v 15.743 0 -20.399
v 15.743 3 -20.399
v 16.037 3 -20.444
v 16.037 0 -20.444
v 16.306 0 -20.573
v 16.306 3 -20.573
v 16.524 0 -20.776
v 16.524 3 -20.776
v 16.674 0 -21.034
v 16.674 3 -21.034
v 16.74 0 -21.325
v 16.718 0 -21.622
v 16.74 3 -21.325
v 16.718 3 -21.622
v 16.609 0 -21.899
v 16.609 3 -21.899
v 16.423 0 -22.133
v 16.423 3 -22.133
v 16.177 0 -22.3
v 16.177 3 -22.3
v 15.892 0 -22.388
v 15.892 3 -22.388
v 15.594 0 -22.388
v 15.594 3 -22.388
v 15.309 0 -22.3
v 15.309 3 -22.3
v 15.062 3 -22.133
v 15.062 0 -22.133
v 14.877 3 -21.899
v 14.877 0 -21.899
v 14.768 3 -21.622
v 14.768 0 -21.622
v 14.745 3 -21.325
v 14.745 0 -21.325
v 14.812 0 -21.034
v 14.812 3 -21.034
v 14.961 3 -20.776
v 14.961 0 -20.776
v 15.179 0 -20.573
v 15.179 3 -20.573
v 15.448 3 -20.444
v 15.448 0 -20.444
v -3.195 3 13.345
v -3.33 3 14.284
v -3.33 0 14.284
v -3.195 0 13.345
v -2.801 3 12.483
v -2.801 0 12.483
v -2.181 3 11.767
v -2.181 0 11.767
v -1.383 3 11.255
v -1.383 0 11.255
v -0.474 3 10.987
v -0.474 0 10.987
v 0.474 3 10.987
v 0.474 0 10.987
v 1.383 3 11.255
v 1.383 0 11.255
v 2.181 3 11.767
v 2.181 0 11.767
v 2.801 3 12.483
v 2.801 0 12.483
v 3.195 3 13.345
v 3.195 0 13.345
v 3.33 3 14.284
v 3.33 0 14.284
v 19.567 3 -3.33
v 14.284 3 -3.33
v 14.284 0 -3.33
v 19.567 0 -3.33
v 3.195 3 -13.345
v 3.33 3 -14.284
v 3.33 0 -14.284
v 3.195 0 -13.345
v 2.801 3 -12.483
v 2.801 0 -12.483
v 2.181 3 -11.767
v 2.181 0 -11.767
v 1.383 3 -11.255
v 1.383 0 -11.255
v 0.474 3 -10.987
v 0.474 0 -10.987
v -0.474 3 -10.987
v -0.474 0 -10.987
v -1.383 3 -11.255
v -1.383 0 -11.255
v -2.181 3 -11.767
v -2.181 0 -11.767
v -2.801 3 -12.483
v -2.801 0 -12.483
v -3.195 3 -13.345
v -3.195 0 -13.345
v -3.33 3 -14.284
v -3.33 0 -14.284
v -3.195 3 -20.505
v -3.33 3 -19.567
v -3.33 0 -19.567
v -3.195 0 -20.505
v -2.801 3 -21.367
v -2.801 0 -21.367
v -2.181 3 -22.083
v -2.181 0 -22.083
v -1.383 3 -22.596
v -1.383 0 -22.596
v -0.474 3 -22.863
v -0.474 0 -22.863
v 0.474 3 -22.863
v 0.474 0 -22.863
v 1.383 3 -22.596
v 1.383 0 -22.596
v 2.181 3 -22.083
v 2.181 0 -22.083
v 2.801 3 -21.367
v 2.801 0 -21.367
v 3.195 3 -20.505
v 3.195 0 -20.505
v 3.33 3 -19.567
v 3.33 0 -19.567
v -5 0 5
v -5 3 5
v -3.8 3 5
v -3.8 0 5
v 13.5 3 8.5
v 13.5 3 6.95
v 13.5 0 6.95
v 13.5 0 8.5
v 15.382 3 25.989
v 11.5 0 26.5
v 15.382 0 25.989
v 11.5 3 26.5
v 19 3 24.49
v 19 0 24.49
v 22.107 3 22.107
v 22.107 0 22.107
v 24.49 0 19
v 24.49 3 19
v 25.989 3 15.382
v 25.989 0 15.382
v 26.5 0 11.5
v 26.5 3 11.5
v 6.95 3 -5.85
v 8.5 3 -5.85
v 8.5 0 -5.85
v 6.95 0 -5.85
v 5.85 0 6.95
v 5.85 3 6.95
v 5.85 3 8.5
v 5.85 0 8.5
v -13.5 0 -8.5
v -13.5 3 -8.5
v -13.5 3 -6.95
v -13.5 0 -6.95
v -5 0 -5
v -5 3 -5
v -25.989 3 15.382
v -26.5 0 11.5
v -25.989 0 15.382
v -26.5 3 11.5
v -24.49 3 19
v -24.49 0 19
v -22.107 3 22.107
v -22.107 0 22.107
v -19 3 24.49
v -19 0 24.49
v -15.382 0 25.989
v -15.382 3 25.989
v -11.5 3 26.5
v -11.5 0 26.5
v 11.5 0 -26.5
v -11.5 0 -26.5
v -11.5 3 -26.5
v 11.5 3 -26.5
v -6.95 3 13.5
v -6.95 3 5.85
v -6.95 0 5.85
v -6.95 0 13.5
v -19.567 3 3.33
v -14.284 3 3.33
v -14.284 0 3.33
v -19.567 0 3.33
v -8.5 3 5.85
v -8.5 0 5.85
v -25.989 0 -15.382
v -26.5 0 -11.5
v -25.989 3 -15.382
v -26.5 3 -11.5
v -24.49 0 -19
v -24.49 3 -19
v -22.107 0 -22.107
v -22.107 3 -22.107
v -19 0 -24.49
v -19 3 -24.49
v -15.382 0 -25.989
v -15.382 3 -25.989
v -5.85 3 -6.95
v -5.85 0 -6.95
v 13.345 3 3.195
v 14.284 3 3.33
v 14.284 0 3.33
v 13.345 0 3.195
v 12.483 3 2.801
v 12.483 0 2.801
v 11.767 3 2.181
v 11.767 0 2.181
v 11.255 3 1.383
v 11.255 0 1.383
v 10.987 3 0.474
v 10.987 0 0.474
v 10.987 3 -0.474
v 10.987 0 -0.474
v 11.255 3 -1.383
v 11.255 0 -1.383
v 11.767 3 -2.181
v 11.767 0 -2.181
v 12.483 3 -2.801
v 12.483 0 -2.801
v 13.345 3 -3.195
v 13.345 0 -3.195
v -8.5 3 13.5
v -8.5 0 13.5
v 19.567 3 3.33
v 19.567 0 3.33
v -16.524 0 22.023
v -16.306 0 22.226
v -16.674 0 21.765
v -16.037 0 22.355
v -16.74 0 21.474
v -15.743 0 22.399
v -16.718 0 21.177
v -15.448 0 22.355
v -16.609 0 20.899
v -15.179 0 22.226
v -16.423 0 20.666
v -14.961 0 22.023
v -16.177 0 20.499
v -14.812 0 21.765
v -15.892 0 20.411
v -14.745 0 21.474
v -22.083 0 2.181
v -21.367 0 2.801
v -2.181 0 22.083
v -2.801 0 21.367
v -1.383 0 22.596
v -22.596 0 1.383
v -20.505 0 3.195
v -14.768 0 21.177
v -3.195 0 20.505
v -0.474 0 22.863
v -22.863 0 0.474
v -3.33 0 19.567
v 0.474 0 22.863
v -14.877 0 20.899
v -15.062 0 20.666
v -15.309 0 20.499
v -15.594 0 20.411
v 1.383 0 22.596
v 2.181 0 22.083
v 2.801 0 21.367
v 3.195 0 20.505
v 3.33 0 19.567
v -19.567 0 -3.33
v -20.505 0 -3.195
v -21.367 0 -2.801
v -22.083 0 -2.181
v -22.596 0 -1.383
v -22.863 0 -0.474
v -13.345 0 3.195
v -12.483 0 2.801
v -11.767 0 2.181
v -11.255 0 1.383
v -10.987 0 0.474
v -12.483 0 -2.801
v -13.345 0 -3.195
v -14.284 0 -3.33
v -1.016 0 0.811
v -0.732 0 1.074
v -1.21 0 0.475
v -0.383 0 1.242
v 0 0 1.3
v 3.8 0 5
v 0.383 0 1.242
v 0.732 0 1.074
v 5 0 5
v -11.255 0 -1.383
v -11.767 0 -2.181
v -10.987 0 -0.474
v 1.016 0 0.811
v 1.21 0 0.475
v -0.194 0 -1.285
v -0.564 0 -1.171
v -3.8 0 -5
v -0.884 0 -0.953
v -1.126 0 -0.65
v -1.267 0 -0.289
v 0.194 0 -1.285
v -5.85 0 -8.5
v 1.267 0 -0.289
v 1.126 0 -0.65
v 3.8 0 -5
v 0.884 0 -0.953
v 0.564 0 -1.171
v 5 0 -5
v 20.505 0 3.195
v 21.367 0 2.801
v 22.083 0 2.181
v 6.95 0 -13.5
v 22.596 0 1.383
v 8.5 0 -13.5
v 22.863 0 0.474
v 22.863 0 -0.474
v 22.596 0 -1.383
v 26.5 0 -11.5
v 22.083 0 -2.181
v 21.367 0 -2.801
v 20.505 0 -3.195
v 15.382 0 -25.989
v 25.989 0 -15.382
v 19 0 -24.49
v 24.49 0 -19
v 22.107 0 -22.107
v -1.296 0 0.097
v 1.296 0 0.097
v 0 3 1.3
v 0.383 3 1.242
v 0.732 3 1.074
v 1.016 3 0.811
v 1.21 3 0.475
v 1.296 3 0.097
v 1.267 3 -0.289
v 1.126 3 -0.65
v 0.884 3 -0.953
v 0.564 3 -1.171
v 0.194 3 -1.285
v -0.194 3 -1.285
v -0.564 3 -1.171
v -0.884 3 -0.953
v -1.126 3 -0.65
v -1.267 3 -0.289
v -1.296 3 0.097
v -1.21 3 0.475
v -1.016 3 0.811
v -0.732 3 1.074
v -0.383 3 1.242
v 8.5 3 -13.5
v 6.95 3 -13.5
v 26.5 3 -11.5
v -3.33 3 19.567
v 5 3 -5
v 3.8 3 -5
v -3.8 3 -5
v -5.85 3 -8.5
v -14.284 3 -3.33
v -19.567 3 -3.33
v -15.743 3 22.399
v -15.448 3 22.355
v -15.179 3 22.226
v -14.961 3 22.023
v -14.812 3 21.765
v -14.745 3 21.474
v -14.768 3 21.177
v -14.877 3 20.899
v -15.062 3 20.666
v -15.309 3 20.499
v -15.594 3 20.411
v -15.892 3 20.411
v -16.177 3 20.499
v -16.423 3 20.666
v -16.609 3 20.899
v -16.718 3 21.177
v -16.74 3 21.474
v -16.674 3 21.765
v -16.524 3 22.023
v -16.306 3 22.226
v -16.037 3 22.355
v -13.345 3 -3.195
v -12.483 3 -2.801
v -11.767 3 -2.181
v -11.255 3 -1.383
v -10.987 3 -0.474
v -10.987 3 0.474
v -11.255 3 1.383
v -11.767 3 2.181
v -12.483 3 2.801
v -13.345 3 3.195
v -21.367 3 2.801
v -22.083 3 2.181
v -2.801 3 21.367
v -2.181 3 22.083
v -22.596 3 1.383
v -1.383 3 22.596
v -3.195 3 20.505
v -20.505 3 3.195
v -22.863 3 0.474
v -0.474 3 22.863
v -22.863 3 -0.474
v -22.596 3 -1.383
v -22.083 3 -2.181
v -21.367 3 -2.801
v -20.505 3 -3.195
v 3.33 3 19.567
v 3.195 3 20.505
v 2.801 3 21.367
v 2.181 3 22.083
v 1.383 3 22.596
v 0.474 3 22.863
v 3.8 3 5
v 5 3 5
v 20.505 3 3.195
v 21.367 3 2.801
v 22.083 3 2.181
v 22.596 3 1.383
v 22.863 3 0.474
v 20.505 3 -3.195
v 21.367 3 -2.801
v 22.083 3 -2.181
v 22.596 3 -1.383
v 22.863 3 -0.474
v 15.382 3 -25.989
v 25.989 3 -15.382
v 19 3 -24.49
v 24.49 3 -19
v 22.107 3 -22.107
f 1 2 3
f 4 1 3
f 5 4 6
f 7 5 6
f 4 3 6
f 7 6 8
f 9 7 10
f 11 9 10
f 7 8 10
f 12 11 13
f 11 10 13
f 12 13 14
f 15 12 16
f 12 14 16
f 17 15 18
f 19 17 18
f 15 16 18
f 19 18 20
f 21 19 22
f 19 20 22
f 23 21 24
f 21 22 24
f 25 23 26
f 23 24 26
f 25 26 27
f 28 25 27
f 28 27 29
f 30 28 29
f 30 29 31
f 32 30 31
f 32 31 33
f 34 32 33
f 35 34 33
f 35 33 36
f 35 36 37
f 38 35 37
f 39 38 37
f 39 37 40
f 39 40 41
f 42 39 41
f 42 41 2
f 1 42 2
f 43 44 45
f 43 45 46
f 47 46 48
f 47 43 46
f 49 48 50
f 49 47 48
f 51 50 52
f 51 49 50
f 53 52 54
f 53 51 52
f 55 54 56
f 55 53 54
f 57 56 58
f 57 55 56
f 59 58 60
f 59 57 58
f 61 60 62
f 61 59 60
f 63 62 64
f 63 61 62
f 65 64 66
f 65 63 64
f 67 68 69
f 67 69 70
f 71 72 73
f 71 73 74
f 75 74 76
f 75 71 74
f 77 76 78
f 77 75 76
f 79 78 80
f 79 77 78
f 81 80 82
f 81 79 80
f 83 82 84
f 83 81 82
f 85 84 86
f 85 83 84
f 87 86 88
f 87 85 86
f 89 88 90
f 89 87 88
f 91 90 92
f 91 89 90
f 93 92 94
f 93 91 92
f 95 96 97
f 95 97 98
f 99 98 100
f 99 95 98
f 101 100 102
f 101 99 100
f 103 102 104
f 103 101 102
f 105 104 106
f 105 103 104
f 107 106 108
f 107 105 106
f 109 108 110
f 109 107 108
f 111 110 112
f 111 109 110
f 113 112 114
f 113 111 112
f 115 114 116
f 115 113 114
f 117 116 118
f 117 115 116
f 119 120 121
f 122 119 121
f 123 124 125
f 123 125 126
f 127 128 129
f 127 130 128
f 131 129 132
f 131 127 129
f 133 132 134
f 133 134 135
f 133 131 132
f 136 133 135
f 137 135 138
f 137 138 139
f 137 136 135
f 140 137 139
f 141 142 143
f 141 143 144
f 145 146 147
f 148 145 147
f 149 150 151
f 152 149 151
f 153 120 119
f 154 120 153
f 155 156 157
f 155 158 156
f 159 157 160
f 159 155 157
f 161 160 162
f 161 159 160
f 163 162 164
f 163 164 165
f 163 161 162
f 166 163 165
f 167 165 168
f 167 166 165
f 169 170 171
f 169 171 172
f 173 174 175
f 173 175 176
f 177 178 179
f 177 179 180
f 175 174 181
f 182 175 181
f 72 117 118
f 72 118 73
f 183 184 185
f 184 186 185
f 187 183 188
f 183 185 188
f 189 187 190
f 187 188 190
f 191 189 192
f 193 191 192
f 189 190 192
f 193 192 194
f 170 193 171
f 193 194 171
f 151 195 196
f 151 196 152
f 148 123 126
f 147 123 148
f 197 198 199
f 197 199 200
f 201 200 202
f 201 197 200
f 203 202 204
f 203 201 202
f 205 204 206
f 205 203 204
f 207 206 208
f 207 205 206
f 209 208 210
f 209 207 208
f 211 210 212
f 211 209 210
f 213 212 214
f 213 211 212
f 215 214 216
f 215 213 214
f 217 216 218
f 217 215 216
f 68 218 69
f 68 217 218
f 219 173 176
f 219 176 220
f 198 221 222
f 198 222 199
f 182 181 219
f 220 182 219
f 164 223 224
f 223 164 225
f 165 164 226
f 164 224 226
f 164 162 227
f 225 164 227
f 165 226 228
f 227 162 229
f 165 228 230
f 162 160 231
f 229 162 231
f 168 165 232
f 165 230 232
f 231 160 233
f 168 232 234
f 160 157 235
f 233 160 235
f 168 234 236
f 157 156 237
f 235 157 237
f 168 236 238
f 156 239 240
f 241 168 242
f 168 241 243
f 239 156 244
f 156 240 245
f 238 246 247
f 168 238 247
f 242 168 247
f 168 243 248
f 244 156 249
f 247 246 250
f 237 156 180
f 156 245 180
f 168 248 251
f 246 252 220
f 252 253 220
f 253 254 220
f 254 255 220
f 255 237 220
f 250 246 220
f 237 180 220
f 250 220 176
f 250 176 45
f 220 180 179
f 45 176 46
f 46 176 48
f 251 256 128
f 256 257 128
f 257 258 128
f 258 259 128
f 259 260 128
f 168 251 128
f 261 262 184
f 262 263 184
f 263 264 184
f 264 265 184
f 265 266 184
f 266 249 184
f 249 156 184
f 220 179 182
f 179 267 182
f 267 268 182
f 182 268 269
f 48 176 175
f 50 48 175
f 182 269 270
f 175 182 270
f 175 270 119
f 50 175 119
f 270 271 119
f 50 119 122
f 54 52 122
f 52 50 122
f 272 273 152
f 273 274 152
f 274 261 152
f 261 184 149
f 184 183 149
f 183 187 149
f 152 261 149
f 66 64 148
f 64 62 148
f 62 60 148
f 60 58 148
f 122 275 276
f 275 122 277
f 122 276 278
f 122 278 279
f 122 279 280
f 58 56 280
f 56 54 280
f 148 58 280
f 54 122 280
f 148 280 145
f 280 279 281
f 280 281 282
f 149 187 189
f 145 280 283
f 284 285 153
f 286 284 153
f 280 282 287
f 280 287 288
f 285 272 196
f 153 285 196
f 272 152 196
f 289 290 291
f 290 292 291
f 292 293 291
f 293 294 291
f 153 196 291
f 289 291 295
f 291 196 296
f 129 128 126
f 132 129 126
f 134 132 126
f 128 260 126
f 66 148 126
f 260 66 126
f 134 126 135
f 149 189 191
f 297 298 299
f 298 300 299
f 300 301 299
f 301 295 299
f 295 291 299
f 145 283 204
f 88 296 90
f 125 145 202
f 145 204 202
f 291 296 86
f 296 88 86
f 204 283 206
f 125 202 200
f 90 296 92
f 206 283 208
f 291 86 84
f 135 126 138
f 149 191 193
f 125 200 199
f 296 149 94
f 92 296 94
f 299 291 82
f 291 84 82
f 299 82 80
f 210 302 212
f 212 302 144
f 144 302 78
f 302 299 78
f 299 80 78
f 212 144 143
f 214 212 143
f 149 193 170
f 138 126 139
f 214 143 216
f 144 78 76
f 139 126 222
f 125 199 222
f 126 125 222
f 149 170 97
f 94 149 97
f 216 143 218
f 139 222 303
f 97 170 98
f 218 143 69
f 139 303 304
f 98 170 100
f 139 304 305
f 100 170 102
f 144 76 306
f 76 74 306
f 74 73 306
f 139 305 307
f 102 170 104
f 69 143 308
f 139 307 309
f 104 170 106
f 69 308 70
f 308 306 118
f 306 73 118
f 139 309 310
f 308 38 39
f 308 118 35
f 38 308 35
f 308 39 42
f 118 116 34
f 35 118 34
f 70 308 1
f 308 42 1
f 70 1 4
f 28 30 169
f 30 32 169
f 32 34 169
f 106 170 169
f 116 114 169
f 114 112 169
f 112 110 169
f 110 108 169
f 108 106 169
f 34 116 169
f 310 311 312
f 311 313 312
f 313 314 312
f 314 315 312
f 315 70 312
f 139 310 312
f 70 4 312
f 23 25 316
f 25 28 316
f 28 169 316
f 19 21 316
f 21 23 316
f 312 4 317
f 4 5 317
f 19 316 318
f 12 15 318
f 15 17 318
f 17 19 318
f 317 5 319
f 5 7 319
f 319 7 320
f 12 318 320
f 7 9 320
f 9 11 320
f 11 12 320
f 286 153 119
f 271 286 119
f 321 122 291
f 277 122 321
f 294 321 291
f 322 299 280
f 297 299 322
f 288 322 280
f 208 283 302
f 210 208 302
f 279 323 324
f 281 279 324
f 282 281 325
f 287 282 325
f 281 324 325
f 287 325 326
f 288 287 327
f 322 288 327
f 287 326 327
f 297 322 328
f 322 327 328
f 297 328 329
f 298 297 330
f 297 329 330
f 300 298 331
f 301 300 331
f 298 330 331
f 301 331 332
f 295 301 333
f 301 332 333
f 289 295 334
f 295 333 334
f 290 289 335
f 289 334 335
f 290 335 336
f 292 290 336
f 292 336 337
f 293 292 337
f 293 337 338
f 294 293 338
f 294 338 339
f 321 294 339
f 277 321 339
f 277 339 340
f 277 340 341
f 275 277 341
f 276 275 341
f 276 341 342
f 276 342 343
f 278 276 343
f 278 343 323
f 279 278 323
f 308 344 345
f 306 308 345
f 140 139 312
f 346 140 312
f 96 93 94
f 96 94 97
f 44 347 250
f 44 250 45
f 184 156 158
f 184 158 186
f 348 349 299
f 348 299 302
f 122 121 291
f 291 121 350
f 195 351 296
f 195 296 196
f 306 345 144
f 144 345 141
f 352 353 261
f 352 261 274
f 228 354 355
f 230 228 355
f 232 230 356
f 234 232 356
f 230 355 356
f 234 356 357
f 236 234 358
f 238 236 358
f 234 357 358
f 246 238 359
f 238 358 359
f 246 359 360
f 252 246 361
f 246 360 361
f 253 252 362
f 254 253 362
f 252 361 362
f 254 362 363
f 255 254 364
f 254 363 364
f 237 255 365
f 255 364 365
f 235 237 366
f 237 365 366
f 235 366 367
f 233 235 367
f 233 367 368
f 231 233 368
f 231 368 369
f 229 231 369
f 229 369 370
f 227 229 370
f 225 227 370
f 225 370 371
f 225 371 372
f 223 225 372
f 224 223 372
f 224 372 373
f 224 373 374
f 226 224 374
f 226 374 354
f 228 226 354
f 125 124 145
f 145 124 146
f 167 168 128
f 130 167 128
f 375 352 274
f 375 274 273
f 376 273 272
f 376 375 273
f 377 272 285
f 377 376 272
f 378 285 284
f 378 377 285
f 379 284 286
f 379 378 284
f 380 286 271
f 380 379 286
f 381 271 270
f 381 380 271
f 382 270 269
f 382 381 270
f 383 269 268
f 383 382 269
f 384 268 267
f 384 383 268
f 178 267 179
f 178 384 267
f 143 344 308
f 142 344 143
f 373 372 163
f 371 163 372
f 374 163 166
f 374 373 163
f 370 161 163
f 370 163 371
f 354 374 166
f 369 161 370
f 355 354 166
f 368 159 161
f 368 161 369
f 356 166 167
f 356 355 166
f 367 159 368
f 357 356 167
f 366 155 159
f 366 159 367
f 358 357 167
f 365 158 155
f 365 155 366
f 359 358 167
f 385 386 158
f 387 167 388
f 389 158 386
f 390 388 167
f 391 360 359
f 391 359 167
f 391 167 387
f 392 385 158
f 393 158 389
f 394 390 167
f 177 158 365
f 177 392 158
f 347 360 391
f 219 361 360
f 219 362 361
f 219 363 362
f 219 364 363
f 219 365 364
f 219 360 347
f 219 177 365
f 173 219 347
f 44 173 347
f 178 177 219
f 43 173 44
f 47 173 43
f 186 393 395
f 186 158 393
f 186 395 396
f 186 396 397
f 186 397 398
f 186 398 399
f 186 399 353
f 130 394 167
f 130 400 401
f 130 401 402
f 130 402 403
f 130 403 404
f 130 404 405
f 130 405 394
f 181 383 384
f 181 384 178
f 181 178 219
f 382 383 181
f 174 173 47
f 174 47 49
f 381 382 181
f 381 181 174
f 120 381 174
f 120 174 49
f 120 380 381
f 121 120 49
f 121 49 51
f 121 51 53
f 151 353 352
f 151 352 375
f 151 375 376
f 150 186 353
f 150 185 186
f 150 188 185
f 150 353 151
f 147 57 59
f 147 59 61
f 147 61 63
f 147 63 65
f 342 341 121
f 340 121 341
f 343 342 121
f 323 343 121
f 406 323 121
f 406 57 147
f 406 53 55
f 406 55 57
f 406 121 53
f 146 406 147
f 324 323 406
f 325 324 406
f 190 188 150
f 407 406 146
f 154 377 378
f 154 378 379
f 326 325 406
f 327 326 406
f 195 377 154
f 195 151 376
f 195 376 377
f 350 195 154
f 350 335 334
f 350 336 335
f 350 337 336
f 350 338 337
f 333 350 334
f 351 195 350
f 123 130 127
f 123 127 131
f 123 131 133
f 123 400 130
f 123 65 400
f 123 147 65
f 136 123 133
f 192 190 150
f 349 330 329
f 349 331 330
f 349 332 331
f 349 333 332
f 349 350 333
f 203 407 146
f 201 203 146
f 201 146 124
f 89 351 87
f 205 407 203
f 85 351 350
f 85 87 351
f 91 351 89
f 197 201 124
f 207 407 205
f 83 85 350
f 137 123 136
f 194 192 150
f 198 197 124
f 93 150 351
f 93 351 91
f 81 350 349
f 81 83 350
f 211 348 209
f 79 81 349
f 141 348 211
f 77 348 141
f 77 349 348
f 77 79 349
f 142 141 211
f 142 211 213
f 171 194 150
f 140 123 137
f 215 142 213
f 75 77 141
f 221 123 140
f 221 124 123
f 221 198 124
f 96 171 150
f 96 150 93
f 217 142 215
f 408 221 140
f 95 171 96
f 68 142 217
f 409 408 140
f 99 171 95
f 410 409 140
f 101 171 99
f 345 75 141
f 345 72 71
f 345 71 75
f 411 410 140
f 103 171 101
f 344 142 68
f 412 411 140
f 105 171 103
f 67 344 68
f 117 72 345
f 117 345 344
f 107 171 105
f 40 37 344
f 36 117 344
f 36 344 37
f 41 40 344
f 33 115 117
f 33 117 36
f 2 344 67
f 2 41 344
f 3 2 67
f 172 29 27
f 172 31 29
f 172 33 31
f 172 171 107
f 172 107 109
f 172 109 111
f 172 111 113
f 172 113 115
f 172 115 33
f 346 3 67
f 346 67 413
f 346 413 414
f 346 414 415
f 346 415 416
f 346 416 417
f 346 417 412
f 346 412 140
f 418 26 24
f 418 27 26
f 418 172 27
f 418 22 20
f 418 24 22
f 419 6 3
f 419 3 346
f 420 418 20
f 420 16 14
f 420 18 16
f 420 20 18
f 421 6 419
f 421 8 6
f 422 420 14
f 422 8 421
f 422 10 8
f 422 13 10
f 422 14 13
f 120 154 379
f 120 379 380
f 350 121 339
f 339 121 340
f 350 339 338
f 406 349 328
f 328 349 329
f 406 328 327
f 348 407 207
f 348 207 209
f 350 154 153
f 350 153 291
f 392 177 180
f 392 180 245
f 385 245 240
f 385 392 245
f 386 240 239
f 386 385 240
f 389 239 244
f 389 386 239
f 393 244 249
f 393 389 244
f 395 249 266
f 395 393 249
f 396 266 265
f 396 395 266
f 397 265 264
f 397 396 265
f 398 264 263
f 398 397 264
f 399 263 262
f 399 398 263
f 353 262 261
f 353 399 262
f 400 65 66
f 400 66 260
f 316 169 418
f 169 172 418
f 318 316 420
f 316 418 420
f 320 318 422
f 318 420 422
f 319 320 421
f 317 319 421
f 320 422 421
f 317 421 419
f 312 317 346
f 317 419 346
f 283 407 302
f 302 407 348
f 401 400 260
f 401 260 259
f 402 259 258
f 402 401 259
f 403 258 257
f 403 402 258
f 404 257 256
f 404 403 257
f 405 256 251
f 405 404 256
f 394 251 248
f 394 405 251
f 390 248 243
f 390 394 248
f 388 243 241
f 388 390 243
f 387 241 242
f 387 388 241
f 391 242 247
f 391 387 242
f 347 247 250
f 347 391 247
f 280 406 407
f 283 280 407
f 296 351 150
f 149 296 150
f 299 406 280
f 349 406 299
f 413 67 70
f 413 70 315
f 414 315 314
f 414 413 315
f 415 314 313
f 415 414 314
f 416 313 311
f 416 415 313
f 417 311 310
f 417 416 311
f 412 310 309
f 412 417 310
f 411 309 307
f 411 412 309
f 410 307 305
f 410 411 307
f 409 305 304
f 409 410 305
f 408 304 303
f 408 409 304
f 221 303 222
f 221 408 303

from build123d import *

# Parameters (mm, degrees)
ESBO_O1_W                = 53
ESBO_O1_H                = 53
RESSALTO_EXTRUS_O1_DEPTH = 3
ESBO_O3_R                = 1.3
ESBO_O3_W                = 1.2
ESBO_O3_H                = 10
CORTE_EXTRUS_O1_DEPTH    = 38.596542394
ESBO_O4_W                = 1.55
ESBO_O4_H                = 7.65
ESBO_O4_W_2              = 7.65
ESBO_O4_H_2              = 1.55
CORTE_EXTRUS_O2_DEPTH    = 10
FILETE1_R                = 15
ESBO_O5_R                = 1
CORTE_EXTRUS_O3_DEPTH    = 38.596542394


with BuildPart() as part:
    # Esboço1 → Ressalto-extrusão1 (new body)
    with BuildSketch(Plane(origin=(0, 0, 0), x_dir=(1, 0, 0), z_dir=(0, 1, 0))):
        Rectangle(ESBO_O1_W, ESBO_O1_H)
    extrude(amount=RESSALTO_EXTRUS_O1_DEPTH)

    # Esboço3 → Corte-extrusão1 (cut, through all)
    with BuildSketch(Plane(origin=(0, 3, 0), x_dir=(1, 0, 0), z_dir=(0, 1, 0))):
        with Locations(Location((0, 0, 0), (0, 0, 270))):
            Circle(ESBO_O3_R)
        with Locations((-4.4, 0)):
            Rectangle(ESBO_O3_W, ESBO_O3_H)
        with Locations((4.4, 0)):
            Rectangle(ESBO_O3_W, ESBO_O3_H)
    extrude(amount=-CORTE_EXTRUS_O1_DEPTH, mode=Mode.SUBTRACT)

    # Esboço4 → Corte-extrusão2 (cut)
    with BuildSketch(Plane(origin=(0, 3, 0), x_dir=(-1, 0, 0), z_dir=(0, 1, 0))):
        with Locations((-7.725, -9.675)):
            Rectangle(ESBO_O4_W, ESBO_O4_H)
        with Locations((-9.675, 7.725)):
            Rectangle(ESBO_O4_W_2, ESBO_O4_H_2)
        with Locations((7.725, 9.675)):
            Rectangle(ESBO_O4_W, ESBO_O4_H)
        with Locations((9.675, -7.725)):
            Rectangle(ESBO_O4_W_2, ESBO_O4_H_2)
    extrude(amount=-CORTE_EXTRUS_O2_DEPTH, mode=Mode.SUBTRACT)

    # Filete1
    filete1_edges = [part.edges().sort_by_distance(p)[0] for p in [
        (26.5, 1.5, 26.5),
        (-26.5, 1.5, 26.5),
        (-26.5, 1.5, -26.5),
        (26.5, 1.5, -26.5),
    ]]
    fillet(filete1_edges, radius=FILETE1_R)

    # Esboço5 → Corte-extrusão3 (cut, through all)
    with BuildSketch(Plane(origin=(0, 3, 0), x_dir=(1, 0, 0), z_dir=(0, 1, 0))):
        with Locations(Location((-15.742640687, -21.399494937, 0), (0, 0, 270))):
            Circle(ESBO_O5_R)
        with Locations(Location((15.742640687, 21.399494937, 0), (0, 0, 270))):
            Circle(ESBO_O5_R)
        with BuildLine():
            Line((19.566648228, -3.32990767), (14.283511733, -3.32990767))
            ThreePointArc((14.283511733, -3.32990767), (10.953604064, 0), (14.283511733, 3.32990767))
            Line((14.283511733, 3.32990767), (19.566648228, 3.32990767))
            ThreePointArc((19.566648228, 3.32990767), (22.896555897, 0), (19.566648228, -3.32990767))
        make_face()
        with BuildLine():
            Line((-3.32990767, -19.566648228), (-3.32990767, -14.283511733))
            ThreePointArc((-3.32990767, -14.283511733), (0, -10.953604064), (3.32990767, -14.283511733))
            Line((3.32990767, -14.283511733), (3.32990767, -19.566648228))
            ThreePointArc((3.32990767, -19.566648228), (0, -22.896555897), (-3.32990767, -19.566648228))
        make_face()
        with BuildLine():
            Line((-19.566648228, 3.32990767), (-14.283511733, 3.32990767))
            ThreePointArc((-14.283511733, 3.32990767), (-10.953604064, 0), (-14.283511733, -3.32990767))
            Line((-14.283511733, -3.32990767), (-19.566648228, -3.32990767))
            ThreePointArc((-19.566648228, -3.32990767), (-22.896555897, 0), (-19.566648228, 3.32990767))
        make_face()
        with BuildLine():
            Line((3.32990767, 19.566648228), (3.32990767, 14.283511733))
            ThreePointArc((3.32990767, 14.283511733), (0, 10.953604064), (-3.32990767, 14.283511733))
            Line((-3.32990767, 14.283511733), (-3.32990767, 19.566648228))
            ThreePointArc((-3.32990767, 19.566648228), (0, 22.896555897), (3.32990767, 19.566648228))
        make_face()
    extrude(amount=-CORTE_EXTRUS_O3_DEPTH, mode=Mode.SUBTRACT)


solid = part.part
